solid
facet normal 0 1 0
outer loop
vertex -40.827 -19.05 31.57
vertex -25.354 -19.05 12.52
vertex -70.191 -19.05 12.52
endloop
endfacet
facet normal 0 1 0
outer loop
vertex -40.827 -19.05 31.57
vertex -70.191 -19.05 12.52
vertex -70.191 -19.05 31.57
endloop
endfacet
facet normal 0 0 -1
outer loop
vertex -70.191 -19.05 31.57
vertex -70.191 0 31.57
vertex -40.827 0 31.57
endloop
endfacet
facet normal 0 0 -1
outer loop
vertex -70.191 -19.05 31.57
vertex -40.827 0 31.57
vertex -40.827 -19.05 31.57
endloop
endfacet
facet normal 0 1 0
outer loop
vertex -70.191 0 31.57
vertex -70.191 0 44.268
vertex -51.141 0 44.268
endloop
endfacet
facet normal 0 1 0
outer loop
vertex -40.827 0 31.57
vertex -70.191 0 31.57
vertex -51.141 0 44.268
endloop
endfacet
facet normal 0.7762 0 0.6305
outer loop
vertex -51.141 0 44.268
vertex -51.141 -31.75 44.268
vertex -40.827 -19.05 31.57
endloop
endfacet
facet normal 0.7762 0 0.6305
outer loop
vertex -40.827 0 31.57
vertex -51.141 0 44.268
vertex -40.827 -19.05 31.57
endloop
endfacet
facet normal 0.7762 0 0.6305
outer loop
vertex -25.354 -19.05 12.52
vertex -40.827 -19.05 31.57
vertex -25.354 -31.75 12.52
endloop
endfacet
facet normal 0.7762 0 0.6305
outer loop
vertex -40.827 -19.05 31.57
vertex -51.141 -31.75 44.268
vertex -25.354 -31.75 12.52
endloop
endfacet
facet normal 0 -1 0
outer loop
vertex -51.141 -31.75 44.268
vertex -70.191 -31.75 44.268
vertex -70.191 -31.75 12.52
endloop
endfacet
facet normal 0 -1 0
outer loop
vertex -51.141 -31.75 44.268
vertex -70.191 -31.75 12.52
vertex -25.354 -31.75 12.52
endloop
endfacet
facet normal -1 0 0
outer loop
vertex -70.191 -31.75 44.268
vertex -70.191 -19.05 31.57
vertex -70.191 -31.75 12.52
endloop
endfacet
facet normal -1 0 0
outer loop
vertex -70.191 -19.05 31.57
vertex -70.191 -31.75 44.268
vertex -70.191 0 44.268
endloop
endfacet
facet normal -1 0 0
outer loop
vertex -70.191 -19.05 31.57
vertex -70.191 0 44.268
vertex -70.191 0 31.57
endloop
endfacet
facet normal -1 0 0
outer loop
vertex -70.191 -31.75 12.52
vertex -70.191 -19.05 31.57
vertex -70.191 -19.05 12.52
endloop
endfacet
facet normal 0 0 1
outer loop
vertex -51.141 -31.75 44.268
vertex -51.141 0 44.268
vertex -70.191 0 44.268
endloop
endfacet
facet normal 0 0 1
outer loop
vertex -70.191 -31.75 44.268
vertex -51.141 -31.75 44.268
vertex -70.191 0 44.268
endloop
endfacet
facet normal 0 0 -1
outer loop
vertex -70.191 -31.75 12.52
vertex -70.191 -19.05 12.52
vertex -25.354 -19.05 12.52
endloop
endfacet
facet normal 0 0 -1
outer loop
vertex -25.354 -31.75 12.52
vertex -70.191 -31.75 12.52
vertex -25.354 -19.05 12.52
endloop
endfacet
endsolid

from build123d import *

# Parameters (mm, degrees)
F1_DEPTH = 31.75
F3_DEPTH = 31.75
F4_W     = 19.05
F4_H     = 19.05
F5_DEPTH = 50.8


with BuildPart() as f1:
    # F0 (on Front) → F1 (new body)
    with BuildSketch(Plane.XZ):
        Polygon((-70.190806, 44.267751), (-70.190806, 12.520112), (-25.353641, 12.520112), (-25.740806, 44.267751), align=None)
    extrude(amount=F1_DEPTH)

    # F2 (on face) → F3 (cut)
    with BuildSketch(Plane.XZ.offset(31.75)):
        Polygon((-25.740806, 44.267751), (-51.140806, 44.267751), (-25.353641, 12.520112), align=None)
    extrude(amount=-F3_DEPTH, mode=Mode.SUBTRACT)

    # F4 (on face) → F5 (cut)
    with BuildSketch(Plane(origin=(-70.190806, 0, 0), x_dir=(0, -1, 0), z_dir=(-1, 0, 0))):
        with Locations((9.525, 22.045112)):
            Rectangle(F4_W, F4_H)
    extrude(amount=-F5_DEPTH, mode=Mode.SUBTRACT)


solid = f1.part
